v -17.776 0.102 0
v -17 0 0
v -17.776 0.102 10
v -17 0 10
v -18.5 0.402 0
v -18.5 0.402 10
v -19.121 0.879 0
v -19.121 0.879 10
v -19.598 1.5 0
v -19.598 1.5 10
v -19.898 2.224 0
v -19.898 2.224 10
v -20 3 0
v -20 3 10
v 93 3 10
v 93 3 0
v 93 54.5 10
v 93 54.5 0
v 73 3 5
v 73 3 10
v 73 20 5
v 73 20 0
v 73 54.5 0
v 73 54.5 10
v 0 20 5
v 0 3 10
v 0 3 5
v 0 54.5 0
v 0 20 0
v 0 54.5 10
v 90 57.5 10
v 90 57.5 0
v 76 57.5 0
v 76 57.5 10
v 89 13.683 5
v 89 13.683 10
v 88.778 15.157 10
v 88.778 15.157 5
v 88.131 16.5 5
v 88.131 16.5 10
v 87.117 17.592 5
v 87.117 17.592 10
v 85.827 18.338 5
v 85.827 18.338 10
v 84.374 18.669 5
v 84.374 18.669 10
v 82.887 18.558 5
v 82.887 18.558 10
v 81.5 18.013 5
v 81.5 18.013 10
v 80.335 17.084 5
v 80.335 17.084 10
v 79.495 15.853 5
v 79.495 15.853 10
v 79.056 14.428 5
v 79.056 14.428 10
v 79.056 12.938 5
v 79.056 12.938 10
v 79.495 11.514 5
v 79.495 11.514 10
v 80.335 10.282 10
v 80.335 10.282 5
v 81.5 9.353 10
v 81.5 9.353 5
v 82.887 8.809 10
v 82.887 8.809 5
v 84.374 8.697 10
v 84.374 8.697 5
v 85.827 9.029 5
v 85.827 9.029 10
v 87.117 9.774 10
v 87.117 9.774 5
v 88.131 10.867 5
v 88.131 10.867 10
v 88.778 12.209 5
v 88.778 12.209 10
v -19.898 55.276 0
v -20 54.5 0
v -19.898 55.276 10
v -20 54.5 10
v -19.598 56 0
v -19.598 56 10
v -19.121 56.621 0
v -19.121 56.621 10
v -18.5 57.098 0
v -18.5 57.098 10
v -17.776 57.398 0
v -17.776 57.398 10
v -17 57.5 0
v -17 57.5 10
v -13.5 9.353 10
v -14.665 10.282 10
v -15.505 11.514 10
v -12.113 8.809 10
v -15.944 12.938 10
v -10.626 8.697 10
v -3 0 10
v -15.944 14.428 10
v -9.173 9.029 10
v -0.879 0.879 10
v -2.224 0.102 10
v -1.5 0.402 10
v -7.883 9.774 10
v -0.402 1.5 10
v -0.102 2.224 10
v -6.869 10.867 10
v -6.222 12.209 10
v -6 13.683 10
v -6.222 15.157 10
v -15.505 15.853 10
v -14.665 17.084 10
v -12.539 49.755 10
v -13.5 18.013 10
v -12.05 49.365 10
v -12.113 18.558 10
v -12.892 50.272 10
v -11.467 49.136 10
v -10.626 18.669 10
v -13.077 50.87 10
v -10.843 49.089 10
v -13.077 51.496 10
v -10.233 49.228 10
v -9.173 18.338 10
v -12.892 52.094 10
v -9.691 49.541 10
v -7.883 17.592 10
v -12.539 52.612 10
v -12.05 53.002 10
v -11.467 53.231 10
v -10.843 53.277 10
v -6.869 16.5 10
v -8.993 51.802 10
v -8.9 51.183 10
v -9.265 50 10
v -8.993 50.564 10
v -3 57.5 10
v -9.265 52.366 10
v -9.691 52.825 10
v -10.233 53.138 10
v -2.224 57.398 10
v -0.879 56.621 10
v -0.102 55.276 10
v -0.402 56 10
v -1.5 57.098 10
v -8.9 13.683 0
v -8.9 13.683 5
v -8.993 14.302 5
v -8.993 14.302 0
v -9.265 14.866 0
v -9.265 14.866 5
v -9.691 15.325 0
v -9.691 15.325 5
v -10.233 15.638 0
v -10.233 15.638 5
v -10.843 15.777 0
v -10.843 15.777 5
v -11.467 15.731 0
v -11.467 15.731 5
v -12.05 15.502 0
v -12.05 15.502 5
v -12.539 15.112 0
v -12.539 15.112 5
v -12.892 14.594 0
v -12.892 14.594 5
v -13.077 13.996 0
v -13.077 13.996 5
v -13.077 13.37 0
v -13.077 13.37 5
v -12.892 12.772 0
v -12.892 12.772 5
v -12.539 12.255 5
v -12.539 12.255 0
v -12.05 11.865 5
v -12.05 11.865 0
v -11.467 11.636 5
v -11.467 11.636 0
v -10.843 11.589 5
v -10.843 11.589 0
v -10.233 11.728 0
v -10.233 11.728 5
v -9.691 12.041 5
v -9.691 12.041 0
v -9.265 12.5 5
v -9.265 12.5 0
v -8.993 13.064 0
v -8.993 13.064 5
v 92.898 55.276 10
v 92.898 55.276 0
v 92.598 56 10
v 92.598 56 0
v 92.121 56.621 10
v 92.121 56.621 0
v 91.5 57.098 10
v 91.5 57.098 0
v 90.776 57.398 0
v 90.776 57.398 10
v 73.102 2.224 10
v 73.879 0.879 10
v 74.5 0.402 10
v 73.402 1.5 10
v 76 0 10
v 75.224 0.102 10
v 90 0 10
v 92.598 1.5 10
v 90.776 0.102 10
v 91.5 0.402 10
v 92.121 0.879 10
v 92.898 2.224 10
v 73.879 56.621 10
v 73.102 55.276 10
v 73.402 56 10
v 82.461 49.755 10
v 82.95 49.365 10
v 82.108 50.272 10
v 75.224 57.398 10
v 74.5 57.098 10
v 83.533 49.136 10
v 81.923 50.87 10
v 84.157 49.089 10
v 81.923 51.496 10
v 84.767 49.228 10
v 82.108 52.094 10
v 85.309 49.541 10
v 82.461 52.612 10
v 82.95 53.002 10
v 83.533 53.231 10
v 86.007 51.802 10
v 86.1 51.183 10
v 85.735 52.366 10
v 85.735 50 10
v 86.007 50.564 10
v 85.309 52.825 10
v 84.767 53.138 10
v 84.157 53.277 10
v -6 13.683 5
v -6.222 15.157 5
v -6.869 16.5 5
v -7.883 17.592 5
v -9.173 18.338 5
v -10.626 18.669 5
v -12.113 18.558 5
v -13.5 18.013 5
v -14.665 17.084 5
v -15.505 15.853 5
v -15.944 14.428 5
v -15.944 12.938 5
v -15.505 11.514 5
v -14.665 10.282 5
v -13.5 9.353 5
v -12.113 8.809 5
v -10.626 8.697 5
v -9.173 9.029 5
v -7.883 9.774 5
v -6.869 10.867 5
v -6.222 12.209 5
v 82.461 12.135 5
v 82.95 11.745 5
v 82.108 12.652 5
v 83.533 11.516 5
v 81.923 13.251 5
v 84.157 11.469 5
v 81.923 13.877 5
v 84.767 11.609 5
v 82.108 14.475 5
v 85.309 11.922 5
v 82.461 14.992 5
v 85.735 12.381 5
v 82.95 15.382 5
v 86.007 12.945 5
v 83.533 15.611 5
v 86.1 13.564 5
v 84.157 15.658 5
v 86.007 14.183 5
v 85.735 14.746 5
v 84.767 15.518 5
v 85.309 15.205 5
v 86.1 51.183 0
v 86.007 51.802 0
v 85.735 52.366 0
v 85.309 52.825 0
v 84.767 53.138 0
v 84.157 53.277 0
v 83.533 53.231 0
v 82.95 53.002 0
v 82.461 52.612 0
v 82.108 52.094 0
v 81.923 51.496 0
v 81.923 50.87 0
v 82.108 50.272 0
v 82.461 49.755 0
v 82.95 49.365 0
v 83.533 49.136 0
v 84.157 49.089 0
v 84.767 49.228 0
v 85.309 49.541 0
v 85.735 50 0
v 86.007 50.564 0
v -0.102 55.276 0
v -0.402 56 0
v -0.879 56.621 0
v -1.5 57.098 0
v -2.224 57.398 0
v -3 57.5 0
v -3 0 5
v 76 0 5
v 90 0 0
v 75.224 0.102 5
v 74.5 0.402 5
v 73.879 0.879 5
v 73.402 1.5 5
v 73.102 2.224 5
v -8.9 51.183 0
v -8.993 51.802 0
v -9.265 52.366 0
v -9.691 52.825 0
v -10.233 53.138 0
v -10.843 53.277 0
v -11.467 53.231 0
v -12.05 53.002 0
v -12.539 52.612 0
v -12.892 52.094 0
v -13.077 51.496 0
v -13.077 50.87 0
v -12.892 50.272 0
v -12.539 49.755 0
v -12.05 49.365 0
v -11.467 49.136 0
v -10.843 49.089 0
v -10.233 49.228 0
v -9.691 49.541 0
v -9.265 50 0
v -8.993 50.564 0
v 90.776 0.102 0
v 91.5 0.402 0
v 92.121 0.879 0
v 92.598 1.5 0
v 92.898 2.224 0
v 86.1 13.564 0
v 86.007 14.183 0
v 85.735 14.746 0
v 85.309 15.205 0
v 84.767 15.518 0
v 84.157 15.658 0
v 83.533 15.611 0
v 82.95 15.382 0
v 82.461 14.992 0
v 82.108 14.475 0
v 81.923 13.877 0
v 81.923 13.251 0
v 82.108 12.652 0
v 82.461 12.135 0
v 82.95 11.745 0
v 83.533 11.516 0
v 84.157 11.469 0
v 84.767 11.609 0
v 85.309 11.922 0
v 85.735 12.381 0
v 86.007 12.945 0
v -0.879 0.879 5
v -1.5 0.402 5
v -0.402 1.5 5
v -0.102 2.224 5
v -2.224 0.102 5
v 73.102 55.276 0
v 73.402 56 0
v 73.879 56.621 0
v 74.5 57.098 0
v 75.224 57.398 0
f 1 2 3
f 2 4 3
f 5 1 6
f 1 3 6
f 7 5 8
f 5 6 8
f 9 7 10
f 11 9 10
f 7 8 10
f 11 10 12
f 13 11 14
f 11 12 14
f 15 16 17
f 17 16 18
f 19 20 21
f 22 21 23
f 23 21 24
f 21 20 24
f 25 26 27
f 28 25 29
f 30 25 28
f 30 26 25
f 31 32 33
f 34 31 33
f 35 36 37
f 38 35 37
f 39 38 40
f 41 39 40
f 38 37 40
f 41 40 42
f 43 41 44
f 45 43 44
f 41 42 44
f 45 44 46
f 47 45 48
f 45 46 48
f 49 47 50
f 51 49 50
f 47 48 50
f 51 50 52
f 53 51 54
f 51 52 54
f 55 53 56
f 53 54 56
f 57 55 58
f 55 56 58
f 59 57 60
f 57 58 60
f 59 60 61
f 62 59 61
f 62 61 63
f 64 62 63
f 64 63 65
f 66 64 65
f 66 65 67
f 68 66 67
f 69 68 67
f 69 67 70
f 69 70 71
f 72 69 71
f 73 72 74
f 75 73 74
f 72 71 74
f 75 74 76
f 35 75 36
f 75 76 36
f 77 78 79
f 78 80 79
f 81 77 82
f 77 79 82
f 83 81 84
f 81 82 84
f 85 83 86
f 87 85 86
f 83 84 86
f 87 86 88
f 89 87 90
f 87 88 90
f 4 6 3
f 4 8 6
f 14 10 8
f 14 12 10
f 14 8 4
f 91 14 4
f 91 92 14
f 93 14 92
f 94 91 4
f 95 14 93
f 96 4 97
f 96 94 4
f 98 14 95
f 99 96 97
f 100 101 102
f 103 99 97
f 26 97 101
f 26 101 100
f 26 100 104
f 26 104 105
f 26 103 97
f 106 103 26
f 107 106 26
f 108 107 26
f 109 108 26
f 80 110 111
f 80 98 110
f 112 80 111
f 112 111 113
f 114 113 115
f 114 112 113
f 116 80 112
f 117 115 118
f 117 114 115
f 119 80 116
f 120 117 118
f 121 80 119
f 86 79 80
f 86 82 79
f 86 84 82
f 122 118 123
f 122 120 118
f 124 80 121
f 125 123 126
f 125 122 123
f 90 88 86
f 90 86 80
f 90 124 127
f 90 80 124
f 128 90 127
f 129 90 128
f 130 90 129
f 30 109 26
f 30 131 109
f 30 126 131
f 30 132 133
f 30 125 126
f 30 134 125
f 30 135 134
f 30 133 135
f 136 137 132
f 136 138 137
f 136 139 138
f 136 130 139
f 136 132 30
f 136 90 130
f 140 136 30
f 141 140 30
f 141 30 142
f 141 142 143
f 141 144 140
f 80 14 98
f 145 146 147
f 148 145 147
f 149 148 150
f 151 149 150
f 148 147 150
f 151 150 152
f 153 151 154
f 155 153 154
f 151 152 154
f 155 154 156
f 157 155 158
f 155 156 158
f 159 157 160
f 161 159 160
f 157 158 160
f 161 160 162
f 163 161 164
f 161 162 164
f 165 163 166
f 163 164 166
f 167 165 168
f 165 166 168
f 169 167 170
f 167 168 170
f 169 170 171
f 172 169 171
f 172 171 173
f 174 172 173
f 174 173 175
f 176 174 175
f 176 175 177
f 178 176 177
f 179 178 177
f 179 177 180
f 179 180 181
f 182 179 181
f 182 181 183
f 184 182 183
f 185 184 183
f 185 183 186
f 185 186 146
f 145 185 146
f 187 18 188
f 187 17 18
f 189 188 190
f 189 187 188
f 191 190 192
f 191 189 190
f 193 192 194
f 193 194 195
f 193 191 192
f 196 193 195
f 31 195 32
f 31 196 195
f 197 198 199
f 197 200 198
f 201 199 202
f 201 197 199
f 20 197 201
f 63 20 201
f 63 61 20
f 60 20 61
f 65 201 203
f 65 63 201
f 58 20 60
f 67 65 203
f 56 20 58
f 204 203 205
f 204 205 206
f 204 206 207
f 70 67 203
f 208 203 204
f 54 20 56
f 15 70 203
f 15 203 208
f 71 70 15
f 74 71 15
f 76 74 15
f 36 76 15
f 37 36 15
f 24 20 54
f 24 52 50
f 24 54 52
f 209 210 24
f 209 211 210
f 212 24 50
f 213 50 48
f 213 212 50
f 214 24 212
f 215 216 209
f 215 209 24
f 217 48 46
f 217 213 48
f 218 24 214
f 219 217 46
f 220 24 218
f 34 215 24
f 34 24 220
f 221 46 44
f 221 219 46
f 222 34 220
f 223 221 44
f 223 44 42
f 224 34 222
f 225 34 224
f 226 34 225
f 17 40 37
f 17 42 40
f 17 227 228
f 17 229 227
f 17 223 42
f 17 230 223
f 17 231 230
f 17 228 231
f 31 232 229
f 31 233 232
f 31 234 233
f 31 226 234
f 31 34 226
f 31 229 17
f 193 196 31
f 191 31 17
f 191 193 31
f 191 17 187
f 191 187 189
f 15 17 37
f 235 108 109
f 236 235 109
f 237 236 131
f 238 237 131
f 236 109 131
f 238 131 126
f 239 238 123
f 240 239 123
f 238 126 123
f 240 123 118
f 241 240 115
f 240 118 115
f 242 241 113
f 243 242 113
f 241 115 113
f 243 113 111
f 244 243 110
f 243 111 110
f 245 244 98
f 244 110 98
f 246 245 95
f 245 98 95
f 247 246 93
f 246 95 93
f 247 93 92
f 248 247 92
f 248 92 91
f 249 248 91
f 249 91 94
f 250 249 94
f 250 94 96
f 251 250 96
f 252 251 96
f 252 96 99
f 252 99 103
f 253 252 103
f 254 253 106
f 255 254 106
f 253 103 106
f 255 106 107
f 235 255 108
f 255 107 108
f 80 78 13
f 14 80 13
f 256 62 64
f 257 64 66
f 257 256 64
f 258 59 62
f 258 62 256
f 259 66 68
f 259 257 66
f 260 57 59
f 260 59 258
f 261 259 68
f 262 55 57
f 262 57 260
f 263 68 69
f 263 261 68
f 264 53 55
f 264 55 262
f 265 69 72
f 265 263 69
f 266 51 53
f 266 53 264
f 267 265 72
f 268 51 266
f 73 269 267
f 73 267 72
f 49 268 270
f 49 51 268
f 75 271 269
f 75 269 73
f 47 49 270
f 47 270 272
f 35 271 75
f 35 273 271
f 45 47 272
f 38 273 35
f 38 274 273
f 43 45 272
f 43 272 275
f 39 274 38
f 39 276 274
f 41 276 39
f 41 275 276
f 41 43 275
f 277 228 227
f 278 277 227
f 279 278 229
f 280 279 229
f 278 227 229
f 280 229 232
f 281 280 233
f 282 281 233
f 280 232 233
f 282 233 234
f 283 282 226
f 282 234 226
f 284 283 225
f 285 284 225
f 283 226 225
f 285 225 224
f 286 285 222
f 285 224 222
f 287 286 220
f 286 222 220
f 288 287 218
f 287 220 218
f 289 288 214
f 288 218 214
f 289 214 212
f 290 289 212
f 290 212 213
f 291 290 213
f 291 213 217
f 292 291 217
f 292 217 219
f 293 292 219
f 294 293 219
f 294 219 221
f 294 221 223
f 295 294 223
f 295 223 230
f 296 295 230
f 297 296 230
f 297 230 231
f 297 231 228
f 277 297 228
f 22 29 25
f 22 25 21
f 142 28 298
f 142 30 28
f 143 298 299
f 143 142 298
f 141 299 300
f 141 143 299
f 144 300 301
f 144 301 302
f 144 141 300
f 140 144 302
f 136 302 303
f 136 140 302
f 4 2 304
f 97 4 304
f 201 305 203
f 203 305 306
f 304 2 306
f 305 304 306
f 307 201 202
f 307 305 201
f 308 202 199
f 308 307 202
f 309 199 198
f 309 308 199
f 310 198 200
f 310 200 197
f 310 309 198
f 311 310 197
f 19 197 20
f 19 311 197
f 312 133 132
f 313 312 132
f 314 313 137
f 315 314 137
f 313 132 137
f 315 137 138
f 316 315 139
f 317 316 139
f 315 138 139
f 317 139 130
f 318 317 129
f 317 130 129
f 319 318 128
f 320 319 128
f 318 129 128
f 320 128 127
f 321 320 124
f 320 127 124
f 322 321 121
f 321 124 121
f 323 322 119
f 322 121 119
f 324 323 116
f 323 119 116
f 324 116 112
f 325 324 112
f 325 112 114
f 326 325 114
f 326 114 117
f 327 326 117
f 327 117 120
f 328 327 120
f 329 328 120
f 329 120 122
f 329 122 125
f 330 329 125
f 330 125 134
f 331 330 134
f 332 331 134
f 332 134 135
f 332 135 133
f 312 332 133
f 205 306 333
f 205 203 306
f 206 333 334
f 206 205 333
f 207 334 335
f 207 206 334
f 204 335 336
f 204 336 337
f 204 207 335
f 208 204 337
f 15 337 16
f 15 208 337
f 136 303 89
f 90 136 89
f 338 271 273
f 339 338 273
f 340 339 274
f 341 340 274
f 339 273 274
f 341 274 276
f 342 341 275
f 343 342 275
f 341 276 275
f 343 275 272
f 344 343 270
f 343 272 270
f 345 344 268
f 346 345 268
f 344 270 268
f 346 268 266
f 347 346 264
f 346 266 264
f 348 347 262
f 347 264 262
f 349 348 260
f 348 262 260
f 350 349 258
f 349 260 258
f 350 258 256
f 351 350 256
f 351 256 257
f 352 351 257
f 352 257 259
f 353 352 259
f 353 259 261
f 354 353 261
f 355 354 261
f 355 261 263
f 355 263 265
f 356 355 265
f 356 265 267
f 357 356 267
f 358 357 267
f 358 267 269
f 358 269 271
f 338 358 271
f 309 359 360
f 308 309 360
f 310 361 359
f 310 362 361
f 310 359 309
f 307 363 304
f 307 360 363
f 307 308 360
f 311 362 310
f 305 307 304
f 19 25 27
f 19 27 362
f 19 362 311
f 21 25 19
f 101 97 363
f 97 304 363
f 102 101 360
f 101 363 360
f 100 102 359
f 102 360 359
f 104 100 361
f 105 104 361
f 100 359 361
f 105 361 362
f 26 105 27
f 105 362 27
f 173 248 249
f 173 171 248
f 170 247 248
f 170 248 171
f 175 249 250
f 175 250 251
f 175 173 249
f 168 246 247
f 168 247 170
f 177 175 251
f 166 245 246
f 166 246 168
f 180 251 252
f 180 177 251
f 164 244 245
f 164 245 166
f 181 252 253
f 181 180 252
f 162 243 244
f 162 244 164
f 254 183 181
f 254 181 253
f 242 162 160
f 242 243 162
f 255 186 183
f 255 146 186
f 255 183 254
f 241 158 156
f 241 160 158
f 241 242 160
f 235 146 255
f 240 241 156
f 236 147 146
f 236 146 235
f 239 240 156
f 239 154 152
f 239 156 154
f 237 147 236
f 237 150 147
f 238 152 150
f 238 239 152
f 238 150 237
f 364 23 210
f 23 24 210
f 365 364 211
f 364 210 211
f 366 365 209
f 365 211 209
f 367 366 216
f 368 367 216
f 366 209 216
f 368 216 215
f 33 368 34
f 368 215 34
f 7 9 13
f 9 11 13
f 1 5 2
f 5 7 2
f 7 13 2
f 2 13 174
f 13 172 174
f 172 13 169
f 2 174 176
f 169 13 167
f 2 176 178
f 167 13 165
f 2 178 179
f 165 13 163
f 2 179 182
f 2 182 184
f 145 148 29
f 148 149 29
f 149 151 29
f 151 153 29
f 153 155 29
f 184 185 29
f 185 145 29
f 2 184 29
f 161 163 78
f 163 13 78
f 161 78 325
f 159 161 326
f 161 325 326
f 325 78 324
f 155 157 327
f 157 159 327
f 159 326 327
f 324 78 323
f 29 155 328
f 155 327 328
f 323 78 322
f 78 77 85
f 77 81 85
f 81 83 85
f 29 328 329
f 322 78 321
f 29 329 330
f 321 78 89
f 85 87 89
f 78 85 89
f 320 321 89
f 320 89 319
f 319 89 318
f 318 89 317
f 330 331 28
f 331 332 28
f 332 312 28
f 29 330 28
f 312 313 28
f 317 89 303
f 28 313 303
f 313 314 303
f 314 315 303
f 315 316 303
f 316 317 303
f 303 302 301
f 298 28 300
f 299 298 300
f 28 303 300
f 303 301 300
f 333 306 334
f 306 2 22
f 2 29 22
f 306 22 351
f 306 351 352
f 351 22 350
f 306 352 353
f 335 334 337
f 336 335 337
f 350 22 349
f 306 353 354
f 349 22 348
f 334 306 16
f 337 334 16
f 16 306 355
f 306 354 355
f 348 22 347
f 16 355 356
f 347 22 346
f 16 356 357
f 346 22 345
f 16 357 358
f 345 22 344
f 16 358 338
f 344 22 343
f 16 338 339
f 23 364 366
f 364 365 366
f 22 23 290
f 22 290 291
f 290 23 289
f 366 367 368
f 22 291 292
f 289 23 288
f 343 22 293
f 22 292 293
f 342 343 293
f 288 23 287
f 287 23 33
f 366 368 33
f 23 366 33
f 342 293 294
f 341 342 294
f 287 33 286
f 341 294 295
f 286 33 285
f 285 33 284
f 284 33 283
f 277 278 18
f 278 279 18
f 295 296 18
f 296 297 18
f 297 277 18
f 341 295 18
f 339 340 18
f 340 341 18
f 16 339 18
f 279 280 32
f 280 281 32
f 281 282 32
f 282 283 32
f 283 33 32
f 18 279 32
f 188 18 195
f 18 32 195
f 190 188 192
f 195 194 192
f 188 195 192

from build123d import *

# Parameters (mm, degrees)
F0_W     = 73
F0_H     = 20
F1_DEPTH = 10
F2_W     = 73
F2_H     = 20
F3_DEPTH = 5
F4_R     = 2.1
F5_DEPTH = 10.001
F6_R     = 5
F6_R_2   = 2.1
F7_DEPTH = 5
F8_R     = 3


with BuildPart() as f1:
    # F0 (on Top) → F1 (new body)
    with BuildSketch(Plane.XY):
        Polygon((-20, 0), (0, 0), (0, 20), (0, 57.5), (-20, 57.5), align=None)
        with Locations((36.5, 10)):
            Rectangle(F0_W, F0_H)
        Polygon((73, 20), (73, 0), (93, 0), (93, 57.5), (73, 57.5), align=None)
    extrude(amount=F1_DEPTH)

    # F2 (on face) → F3 (cut)
    with BuildSketch(Plane.XY.offset(10)):
        with Locations((36.5, 10)):
            Rectangle(F2_W, F2_H)
    extrude(amount=-F3_DEPTH, mode=Mode.SUBTRACT)

    # F4 (on face) → F5 (cut, through all)
    with BuildSketch(Plane.XY.offset(10)):
        with Locations((-11, 13.6832475166)):
            Circle(F4_R)
        with Locations((84, 13.563519451)):
            Circle(F4_R)
        with Locations((-11, 51.1832475166)):
            Circle(F4_R)
        with Locations((84, 51.1832475166)):
            Circle(F4_R)
    extrude(amount=-F5_DEPTH, mode=Mode.SUBTRACT)

    # F6 (on face) → F7 (cut)
    with BuildSketch(Plane.XY.offset(10)):
        with Locations((-11, 13.6832475166)):
            Circle(F6_R)
        with Locations((-11, 13.6832475166)):
            Circle(F6_R_2, mode=Mode.SUBTRACT)
        with Locations((84, 13.6832475166)):
            Circle(F6_R)
    extrude(amount=-F7_DEPTH, mode=Mode.SUBTRACT)

    # F8
    f8_edges = [f1.edges().sort_by_distance(p)[0] for p in [
        (-20, 57.5, 5),
        (0, 57.5, 5),
        (73, 57.5, 5),
        (93, 57.5, 5),
        (-20, 0, 5),
        (93, 0, 5),
        (0, 0, 7.5),
        (73, 0, 7.5),
    ]]
    fillet(f8_edges, radius=F8_R)


solid = f1.part
